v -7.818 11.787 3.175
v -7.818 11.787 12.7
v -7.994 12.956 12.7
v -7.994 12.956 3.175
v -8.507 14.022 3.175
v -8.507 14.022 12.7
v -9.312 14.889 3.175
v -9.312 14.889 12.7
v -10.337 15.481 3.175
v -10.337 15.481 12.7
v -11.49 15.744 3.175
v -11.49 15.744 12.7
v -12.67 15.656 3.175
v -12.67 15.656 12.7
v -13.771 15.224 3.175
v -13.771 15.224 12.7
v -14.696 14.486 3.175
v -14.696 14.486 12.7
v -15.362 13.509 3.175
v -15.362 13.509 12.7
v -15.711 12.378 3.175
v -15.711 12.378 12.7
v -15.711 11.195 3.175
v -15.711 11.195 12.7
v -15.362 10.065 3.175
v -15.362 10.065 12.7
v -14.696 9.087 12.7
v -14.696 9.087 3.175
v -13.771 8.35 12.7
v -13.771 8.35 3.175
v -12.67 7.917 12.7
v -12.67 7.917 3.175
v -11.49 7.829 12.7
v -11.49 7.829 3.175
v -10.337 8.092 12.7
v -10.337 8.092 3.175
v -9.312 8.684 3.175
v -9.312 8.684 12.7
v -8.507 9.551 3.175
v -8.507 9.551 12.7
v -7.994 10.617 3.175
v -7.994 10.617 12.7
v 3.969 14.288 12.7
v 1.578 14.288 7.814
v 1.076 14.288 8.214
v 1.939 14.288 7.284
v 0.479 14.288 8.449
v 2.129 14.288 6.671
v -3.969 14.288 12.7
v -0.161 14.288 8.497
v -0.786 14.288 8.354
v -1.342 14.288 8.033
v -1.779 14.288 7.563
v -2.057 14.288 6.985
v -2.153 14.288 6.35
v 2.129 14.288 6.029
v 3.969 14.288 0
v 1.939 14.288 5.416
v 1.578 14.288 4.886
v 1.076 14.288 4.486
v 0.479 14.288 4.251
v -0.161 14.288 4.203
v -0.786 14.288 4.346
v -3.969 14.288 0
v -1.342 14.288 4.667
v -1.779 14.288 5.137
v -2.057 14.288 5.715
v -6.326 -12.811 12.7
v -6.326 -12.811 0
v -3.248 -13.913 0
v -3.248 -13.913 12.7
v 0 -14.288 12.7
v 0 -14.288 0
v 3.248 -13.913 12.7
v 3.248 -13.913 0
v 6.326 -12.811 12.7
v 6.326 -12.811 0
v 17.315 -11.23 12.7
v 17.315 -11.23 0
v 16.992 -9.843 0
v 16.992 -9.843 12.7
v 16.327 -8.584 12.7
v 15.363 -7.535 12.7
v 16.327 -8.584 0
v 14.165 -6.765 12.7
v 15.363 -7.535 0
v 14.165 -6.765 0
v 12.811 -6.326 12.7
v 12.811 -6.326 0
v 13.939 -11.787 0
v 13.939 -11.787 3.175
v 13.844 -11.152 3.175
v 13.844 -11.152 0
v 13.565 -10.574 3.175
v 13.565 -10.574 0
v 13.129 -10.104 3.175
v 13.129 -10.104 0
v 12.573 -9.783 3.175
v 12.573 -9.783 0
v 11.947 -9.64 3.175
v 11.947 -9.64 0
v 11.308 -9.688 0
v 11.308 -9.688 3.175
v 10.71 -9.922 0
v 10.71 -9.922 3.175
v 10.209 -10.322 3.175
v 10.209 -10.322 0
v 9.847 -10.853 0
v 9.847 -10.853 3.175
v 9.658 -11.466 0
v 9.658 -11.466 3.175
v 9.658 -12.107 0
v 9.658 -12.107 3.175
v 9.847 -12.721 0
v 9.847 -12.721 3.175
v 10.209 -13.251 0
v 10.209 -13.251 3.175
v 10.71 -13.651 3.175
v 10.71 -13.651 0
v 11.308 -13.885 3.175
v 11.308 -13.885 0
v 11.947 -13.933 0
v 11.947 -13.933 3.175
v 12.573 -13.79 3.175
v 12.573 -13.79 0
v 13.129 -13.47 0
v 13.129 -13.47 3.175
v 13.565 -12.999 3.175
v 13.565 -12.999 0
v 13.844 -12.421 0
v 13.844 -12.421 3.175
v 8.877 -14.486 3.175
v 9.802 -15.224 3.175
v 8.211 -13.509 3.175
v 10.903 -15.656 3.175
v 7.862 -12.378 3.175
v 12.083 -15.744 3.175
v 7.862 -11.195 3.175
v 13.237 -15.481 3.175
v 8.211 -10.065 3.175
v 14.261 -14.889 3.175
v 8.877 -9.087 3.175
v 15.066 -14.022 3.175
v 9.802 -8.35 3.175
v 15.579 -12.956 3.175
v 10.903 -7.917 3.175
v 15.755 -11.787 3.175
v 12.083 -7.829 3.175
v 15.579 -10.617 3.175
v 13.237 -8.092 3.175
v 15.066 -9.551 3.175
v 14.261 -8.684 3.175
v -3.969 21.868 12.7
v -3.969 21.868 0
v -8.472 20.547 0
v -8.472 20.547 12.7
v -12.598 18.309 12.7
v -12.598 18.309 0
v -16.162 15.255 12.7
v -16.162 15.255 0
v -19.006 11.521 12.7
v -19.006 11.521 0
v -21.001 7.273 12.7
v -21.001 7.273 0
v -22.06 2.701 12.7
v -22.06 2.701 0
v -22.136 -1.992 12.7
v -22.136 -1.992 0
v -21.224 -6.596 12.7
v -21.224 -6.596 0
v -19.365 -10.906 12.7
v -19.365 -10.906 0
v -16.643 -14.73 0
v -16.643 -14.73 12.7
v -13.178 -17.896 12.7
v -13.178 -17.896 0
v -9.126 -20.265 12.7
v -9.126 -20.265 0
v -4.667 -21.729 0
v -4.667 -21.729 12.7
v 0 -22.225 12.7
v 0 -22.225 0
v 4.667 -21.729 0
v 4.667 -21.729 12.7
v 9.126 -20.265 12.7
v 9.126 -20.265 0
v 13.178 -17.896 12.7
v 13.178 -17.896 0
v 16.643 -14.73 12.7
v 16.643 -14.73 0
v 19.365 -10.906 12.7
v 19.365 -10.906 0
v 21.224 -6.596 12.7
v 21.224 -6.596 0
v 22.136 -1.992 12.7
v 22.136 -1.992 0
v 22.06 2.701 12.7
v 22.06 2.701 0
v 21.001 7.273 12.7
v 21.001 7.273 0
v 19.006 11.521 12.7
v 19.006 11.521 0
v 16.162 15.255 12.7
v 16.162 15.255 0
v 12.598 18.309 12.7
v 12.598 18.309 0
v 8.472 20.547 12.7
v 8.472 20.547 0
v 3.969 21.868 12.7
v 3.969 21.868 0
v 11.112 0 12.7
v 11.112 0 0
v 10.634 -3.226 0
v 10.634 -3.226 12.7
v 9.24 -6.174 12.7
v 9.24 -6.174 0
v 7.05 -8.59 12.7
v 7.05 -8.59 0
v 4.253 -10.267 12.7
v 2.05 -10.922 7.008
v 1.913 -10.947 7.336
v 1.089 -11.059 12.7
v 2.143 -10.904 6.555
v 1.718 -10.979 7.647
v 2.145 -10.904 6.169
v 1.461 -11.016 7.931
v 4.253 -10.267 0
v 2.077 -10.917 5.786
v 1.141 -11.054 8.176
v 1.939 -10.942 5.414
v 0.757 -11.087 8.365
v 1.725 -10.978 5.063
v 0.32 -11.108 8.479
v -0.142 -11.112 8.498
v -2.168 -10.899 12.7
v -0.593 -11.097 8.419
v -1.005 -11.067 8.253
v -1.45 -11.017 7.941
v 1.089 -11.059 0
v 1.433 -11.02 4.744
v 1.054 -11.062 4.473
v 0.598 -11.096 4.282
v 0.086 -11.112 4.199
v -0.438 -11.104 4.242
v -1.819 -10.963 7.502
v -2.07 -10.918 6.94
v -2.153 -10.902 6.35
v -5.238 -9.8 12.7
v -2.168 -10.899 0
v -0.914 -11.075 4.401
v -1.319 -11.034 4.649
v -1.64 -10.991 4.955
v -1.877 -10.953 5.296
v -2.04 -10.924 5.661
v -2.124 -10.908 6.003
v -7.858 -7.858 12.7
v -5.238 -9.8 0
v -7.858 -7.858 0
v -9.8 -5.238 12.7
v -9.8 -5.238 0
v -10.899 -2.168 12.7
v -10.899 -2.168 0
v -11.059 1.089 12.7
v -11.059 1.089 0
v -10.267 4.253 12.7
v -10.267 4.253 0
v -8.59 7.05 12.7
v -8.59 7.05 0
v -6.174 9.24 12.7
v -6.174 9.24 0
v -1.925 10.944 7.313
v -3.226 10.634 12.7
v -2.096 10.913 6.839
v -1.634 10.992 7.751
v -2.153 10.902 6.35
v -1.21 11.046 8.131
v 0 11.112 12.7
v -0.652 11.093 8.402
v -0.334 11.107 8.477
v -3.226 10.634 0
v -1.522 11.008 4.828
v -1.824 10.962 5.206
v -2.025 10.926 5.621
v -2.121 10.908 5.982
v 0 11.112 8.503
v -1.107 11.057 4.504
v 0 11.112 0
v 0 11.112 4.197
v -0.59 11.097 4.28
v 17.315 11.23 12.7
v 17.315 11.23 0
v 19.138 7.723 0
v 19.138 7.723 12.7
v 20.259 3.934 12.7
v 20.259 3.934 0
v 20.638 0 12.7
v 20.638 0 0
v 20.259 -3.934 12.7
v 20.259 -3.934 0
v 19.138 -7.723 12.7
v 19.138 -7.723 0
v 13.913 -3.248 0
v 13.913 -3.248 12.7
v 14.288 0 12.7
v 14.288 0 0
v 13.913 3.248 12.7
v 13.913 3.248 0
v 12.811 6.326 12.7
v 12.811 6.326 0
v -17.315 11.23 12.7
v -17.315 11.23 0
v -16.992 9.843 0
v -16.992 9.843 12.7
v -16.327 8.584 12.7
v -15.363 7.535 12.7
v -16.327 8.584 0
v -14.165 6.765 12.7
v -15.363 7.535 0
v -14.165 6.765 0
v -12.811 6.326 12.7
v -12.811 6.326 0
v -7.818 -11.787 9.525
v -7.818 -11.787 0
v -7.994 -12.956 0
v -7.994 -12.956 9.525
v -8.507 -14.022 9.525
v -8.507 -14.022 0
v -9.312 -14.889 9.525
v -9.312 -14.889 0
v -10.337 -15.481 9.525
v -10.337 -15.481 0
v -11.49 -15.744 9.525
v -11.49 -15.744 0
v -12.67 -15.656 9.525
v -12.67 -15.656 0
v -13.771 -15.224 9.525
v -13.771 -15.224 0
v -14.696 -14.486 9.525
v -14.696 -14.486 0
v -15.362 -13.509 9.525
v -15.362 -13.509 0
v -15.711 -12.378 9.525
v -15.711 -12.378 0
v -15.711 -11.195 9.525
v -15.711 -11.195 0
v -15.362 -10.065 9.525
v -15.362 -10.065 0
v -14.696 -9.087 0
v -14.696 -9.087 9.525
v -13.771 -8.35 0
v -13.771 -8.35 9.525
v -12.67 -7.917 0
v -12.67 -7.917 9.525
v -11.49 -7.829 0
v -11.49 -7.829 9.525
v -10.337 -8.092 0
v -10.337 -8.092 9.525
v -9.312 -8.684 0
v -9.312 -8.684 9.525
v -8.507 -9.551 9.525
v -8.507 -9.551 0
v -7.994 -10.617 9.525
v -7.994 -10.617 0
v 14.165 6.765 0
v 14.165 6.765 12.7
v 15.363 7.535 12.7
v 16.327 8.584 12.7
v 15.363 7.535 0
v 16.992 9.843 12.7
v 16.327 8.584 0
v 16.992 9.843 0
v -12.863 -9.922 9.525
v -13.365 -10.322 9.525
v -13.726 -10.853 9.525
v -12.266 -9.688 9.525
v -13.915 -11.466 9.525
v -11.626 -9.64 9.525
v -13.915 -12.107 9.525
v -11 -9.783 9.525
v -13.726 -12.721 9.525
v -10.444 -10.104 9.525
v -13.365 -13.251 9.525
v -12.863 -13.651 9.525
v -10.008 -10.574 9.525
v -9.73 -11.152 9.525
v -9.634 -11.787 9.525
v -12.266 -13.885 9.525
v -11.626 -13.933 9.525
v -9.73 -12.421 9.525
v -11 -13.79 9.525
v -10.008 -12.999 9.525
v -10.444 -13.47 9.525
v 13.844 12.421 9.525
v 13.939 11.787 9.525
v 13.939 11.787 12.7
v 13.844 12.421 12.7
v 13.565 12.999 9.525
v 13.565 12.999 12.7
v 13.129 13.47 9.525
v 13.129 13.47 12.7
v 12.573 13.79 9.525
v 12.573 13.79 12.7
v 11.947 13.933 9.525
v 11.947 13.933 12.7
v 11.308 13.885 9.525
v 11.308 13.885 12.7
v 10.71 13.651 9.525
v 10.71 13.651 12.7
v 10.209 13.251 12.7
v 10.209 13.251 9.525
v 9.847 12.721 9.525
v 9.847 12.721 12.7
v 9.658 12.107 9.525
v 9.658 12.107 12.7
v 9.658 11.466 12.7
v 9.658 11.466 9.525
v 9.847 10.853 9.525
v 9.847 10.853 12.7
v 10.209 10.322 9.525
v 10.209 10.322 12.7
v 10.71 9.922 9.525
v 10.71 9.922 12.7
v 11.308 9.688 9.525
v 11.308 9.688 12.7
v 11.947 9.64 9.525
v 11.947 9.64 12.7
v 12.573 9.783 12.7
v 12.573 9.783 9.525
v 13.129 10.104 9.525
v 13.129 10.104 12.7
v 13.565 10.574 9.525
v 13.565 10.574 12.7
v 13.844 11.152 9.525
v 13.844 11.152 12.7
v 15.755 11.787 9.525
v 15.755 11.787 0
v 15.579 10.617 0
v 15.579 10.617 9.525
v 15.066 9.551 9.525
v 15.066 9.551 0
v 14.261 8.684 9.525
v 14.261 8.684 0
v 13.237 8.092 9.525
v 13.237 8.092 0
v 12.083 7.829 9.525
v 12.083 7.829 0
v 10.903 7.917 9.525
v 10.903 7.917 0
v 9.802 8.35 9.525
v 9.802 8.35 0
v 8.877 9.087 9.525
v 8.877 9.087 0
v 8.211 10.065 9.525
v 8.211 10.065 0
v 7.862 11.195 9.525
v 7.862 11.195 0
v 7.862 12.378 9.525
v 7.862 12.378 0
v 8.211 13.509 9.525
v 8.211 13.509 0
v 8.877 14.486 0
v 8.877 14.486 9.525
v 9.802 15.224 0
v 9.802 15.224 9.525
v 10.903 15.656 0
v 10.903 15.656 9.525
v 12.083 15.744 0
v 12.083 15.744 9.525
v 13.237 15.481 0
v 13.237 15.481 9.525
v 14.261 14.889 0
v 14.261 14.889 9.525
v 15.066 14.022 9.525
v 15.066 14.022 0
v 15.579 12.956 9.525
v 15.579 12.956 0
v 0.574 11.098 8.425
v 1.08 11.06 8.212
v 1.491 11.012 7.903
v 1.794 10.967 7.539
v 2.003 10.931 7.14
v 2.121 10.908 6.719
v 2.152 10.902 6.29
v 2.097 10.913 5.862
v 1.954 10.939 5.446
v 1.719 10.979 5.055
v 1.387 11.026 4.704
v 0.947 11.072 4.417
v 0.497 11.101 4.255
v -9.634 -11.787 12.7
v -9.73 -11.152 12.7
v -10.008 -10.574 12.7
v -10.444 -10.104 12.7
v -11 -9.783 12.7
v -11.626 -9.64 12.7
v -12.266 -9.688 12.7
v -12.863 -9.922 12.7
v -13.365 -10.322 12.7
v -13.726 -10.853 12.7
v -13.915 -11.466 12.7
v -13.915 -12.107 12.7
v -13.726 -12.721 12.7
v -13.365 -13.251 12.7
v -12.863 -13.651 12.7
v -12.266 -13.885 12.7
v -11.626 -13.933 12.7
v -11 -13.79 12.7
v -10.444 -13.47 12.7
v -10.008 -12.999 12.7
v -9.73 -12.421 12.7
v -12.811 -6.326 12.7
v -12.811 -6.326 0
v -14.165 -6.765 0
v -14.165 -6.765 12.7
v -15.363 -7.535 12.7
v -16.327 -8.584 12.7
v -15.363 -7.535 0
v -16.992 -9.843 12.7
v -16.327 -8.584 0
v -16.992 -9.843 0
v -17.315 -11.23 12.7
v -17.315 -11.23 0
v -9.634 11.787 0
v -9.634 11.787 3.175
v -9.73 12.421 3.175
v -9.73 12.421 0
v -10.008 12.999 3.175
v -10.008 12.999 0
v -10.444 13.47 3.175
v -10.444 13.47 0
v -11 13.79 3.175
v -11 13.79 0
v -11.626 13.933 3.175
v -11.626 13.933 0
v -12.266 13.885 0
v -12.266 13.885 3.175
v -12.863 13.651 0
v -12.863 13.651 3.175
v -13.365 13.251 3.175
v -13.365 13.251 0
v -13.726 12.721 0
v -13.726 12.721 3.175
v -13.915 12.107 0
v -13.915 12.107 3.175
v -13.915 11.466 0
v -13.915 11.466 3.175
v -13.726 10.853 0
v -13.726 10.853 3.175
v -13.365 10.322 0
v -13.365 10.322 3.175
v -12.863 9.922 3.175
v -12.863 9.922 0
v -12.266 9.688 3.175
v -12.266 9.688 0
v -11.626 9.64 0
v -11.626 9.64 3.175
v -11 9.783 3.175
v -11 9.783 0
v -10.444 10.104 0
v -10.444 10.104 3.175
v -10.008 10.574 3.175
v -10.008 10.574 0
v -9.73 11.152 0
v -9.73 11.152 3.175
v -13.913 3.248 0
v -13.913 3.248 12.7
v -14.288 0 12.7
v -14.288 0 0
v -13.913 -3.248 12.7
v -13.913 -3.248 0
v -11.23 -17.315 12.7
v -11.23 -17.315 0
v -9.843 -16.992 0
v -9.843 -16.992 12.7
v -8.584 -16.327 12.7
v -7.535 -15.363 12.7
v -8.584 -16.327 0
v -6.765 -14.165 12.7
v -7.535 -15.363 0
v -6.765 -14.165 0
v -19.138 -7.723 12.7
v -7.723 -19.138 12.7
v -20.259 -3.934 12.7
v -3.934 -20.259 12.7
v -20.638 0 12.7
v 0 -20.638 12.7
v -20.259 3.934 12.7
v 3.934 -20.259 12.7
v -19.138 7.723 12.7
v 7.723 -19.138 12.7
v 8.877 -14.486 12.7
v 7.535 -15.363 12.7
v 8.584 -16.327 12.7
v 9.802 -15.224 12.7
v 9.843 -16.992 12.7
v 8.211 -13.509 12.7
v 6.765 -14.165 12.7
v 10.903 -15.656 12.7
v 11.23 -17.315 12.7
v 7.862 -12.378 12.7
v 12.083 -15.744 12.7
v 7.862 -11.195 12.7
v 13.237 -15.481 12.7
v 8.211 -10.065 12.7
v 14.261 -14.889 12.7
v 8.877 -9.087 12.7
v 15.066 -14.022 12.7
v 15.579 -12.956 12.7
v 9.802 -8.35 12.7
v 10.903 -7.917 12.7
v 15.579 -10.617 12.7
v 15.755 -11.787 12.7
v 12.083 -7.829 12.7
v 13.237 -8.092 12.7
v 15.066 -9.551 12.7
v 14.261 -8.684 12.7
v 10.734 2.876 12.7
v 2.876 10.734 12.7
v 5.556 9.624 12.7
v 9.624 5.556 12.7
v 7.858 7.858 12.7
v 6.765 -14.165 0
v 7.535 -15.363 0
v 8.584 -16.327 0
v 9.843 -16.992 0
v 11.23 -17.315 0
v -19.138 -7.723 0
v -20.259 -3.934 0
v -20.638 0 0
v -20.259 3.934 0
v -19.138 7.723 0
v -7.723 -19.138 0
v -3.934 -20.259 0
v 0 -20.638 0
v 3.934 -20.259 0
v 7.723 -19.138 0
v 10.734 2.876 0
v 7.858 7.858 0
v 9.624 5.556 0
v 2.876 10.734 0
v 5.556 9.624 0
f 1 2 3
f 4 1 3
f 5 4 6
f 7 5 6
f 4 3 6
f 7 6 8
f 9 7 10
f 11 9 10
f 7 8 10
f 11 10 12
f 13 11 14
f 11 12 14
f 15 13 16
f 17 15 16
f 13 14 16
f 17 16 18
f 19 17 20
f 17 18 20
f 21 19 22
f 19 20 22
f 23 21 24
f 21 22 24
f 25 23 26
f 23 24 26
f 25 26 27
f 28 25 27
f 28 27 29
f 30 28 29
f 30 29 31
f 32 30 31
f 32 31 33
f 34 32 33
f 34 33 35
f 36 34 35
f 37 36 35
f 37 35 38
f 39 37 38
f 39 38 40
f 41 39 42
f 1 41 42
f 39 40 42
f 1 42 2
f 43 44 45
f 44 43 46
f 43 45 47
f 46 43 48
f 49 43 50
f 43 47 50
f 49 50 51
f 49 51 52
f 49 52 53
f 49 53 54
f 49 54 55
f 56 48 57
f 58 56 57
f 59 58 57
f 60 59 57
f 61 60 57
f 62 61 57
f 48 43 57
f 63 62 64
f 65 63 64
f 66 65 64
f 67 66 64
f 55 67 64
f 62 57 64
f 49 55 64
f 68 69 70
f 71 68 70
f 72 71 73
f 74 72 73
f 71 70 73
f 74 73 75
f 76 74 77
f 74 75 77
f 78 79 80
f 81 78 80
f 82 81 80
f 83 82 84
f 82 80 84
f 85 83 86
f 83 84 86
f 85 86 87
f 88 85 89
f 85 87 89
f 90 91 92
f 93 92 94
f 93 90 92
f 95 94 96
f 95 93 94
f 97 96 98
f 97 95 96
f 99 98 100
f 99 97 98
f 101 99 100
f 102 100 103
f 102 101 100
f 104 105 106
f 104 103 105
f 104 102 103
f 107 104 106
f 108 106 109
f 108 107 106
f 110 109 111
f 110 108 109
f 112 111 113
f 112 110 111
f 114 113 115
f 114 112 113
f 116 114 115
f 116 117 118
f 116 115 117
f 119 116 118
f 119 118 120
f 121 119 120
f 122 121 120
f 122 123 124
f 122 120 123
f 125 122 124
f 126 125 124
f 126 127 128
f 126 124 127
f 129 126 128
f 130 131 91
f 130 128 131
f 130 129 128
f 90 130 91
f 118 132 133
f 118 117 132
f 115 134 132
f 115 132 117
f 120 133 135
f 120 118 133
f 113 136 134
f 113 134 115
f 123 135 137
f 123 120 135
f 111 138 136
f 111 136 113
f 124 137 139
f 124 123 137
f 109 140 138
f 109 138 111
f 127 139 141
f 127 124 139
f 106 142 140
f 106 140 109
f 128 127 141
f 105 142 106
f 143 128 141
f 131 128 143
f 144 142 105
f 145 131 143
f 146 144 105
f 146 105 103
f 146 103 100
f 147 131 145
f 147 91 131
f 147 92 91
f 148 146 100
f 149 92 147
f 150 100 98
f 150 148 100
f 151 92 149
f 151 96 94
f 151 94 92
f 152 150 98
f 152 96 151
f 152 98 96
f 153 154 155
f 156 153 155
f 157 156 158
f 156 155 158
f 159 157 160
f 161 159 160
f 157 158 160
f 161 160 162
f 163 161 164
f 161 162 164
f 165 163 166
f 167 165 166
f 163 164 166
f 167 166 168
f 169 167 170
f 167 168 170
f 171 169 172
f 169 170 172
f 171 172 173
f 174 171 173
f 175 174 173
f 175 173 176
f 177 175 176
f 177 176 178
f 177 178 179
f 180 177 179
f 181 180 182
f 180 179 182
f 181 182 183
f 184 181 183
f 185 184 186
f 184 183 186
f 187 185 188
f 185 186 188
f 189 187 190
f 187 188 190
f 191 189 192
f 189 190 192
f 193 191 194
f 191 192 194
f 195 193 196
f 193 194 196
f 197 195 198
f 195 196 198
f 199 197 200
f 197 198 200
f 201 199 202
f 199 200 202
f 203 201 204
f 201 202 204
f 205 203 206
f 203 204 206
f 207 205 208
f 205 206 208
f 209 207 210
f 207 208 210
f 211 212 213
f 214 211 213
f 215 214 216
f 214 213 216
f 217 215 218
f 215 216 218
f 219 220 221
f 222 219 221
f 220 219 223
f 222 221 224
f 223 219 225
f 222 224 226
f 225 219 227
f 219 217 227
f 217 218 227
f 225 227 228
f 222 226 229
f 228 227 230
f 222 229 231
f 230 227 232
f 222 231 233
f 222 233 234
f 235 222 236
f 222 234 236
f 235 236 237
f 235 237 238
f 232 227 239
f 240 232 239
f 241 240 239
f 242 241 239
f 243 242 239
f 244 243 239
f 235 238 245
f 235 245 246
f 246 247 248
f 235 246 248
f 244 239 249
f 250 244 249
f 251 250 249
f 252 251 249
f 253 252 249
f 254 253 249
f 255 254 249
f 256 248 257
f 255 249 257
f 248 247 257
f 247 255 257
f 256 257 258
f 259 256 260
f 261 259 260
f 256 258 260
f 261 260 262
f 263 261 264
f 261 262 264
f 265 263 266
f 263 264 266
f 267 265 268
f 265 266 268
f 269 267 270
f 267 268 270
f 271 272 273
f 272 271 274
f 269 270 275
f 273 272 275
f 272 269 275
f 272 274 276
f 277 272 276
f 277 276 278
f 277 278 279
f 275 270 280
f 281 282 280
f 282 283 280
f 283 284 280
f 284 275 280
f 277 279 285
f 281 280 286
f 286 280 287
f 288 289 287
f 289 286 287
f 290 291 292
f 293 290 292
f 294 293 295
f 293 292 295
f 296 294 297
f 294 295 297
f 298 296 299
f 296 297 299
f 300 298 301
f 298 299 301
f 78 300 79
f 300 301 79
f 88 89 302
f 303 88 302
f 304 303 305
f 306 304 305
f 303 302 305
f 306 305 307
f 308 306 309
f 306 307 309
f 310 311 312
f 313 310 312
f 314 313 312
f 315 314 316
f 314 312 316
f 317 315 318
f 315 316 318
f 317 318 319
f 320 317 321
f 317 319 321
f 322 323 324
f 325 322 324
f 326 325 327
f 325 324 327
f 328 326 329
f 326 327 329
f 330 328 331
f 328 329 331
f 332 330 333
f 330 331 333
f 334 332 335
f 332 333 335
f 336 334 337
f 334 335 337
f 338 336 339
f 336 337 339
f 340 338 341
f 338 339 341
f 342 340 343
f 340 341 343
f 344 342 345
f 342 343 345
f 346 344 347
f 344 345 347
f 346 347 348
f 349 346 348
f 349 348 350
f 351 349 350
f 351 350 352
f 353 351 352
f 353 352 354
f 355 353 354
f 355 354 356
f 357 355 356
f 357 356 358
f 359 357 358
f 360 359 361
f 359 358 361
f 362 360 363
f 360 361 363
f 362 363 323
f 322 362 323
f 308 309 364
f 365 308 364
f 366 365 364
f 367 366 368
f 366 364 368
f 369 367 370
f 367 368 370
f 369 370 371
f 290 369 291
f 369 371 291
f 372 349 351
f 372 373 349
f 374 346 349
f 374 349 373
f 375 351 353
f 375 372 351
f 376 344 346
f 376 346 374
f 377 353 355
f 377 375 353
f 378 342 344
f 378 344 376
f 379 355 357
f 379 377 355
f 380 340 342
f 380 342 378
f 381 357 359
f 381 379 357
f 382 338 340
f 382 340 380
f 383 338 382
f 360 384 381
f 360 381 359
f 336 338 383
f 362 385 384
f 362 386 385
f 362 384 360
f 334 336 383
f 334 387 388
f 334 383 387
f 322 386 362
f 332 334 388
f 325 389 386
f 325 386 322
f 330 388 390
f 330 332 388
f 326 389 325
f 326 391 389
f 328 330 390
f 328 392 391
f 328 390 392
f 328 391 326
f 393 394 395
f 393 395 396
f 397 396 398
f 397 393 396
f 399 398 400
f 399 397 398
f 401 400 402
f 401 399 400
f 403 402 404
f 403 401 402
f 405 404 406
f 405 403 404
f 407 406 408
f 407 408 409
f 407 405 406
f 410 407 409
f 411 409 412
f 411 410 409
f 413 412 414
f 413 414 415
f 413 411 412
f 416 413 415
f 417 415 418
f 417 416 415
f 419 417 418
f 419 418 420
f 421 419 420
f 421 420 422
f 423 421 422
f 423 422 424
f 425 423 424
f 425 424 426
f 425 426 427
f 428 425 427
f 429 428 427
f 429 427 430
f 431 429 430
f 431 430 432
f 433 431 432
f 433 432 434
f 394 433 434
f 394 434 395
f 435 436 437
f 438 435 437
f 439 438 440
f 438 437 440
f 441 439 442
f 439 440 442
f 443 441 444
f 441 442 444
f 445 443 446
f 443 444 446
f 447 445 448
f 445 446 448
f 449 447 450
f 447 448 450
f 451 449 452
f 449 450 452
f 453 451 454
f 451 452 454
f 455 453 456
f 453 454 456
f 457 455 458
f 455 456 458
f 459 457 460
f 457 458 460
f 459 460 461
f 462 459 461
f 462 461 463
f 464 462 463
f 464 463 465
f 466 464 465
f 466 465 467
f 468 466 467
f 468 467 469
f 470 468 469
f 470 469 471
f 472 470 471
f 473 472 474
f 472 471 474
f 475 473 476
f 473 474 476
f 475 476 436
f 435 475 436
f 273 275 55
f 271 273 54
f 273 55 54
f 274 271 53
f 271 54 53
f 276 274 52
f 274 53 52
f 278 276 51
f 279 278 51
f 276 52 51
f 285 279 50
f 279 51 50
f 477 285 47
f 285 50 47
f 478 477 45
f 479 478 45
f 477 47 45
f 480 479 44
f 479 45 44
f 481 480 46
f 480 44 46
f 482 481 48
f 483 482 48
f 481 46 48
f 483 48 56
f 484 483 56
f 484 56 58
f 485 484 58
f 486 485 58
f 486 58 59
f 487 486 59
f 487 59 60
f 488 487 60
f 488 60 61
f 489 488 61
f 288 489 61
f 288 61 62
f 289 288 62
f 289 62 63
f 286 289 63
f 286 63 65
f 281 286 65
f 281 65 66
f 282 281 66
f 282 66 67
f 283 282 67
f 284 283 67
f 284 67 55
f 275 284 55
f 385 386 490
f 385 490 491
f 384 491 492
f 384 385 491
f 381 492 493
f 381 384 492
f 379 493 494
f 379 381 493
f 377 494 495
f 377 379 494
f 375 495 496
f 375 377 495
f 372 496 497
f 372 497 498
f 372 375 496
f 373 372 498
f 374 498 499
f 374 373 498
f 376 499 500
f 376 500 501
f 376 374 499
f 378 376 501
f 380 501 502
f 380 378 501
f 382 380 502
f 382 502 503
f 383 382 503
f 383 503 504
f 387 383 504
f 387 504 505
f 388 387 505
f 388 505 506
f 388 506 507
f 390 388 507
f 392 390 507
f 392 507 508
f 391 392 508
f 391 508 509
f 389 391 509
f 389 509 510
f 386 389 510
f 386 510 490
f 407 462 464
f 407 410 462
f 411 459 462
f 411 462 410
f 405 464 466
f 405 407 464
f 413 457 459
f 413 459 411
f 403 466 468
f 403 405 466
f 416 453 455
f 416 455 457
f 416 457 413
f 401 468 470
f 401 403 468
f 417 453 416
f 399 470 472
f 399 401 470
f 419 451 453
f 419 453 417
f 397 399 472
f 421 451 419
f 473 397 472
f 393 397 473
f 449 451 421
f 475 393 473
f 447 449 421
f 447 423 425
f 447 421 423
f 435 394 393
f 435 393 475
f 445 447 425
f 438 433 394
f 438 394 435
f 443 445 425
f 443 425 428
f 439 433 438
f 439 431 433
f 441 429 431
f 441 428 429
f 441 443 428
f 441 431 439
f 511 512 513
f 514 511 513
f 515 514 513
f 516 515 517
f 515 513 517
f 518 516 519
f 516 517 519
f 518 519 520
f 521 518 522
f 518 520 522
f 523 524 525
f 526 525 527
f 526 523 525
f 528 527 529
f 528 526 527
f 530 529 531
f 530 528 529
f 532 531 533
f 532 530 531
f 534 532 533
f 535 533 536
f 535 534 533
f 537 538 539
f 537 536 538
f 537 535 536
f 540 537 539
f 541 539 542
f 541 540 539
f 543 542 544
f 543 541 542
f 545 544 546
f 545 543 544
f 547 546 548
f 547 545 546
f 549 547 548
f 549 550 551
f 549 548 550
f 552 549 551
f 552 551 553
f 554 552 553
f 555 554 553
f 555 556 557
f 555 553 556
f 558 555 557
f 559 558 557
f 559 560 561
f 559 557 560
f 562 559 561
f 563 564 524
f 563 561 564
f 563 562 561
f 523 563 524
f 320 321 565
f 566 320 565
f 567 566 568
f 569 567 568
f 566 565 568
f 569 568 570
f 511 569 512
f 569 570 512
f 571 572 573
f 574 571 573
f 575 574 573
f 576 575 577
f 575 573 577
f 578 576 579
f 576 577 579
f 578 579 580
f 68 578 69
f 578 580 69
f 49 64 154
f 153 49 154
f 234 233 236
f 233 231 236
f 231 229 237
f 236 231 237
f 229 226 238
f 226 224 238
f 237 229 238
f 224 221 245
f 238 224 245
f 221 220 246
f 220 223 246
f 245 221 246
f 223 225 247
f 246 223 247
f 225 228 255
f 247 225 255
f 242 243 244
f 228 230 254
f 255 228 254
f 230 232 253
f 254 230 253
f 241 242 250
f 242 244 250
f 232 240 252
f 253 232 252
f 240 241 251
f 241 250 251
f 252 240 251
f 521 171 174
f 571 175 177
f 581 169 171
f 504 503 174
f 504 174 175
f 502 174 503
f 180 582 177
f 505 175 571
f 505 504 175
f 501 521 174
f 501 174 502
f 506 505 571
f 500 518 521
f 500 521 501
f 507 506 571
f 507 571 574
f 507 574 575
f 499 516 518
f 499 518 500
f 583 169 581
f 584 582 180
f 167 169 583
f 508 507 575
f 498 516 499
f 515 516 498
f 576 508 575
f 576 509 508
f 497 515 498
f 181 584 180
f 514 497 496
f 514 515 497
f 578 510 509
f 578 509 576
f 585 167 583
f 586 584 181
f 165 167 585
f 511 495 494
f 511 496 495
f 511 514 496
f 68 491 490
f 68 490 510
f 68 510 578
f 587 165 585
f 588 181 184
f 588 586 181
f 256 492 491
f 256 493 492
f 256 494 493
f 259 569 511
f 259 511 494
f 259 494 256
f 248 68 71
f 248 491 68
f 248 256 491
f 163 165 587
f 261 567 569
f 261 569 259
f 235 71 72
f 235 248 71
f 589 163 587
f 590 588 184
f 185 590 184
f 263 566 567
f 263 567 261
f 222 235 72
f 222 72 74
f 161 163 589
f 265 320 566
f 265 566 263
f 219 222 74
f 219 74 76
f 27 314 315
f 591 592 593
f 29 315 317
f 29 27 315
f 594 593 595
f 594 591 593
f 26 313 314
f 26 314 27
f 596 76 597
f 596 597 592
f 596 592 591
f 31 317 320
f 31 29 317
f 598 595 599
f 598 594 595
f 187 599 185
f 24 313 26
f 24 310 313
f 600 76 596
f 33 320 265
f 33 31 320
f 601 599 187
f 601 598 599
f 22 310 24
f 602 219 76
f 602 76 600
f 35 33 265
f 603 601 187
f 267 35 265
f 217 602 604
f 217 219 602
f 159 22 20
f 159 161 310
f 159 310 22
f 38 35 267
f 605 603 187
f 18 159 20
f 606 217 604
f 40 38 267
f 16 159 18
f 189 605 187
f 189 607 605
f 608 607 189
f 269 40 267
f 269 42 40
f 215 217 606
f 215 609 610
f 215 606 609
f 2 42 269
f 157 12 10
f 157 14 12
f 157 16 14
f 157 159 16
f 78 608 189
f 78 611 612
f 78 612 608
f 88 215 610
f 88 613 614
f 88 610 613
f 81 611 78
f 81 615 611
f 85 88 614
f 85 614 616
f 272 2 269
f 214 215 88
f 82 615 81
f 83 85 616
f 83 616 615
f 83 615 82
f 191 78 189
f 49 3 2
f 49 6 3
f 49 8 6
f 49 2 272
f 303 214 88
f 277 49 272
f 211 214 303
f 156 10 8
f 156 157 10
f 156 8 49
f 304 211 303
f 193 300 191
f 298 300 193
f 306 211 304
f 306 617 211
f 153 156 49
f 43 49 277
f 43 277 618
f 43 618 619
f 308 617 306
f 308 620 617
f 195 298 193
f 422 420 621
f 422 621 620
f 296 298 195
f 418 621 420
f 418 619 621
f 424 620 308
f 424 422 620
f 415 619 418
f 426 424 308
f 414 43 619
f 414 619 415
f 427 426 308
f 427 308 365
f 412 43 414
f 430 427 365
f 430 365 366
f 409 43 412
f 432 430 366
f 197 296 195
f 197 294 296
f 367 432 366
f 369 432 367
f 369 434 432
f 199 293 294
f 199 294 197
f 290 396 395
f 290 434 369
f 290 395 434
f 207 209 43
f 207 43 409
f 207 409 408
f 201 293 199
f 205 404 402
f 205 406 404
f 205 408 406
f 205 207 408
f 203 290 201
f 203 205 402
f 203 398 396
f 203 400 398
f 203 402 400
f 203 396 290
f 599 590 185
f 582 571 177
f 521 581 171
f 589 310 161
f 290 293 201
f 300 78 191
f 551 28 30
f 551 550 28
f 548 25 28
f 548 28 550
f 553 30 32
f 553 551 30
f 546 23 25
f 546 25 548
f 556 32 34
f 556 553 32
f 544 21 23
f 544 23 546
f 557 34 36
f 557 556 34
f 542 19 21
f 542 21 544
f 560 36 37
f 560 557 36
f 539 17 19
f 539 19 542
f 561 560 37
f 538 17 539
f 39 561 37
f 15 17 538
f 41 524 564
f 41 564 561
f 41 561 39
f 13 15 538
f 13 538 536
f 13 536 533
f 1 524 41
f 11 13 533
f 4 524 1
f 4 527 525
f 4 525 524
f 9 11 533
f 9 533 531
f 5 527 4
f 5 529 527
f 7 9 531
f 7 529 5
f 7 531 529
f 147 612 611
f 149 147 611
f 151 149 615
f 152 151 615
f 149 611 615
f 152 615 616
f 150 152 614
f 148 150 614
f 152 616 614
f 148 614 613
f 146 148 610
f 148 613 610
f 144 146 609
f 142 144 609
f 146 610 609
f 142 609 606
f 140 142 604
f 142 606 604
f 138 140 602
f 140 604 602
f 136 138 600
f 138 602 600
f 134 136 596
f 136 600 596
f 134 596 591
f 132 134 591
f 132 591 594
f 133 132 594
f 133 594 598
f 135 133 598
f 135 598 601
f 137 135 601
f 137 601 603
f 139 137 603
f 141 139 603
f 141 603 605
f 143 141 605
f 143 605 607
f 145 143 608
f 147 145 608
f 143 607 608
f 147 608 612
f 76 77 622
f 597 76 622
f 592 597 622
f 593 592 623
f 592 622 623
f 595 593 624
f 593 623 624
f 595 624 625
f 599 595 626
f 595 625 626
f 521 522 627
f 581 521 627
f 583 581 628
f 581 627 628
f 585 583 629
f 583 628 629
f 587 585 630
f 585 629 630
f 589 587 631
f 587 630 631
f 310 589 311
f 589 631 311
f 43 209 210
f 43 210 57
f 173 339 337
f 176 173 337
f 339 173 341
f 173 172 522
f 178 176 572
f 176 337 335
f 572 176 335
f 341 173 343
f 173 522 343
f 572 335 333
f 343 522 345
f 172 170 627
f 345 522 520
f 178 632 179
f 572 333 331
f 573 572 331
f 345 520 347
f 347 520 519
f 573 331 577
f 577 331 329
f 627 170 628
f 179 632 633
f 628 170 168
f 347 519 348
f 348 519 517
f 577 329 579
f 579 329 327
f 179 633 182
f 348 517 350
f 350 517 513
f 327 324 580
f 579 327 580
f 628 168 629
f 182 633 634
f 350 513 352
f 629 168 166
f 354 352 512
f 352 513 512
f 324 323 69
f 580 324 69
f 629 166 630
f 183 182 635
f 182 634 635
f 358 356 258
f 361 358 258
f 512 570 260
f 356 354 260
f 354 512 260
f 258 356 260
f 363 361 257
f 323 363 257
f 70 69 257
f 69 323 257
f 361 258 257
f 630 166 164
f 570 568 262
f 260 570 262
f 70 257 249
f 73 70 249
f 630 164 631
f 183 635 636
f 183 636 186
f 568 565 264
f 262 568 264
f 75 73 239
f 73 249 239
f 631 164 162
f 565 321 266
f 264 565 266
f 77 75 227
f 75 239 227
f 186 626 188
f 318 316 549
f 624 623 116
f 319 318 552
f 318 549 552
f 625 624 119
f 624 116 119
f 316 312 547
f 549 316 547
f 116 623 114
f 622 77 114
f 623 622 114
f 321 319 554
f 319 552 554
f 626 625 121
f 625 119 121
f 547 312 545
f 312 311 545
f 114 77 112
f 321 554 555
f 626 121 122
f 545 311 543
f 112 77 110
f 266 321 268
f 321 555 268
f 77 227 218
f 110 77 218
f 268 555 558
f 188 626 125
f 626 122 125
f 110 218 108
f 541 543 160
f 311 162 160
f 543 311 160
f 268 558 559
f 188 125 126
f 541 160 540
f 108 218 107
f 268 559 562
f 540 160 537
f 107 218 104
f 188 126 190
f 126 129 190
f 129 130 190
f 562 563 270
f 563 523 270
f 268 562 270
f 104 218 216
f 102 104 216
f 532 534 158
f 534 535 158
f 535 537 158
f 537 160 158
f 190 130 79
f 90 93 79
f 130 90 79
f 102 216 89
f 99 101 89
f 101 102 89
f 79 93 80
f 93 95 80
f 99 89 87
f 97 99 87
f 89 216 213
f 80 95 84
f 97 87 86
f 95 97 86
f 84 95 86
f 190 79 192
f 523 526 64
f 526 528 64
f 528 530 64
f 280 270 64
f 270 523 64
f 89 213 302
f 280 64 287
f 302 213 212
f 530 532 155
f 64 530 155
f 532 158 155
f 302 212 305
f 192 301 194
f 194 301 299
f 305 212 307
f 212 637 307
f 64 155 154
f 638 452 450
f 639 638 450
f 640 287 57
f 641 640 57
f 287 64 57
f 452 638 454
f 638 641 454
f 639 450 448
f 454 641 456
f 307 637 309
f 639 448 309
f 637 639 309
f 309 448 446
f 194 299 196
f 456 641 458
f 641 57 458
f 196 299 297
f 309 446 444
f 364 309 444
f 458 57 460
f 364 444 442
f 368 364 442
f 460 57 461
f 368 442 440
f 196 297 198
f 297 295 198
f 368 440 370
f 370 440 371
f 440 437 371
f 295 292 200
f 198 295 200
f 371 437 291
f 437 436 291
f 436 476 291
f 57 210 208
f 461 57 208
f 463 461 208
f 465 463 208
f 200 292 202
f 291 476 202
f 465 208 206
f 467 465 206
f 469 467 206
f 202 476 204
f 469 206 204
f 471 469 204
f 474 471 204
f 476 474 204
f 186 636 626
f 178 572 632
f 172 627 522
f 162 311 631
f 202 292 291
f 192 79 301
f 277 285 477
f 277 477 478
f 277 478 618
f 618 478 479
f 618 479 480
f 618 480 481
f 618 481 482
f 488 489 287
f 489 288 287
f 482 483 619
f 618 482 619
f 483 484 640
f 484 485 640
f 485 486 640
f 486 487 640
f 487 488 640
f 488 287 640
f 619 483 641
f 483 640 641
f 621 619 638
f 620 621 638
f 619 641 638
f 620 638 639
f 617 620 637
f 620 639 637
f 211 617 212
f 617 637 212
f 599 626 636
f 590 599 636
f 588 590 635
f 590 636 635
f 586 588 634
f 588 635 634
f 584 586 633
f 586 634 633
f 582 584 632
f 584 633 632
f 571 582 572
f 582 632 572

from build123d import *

# Parameters (mm, degrees)
F0_R            = 2.15265
F1_DEPTH        = 12.7
F2_R            = 2.15265
F3_REACH        = 42.6021136501
F6_R            = 3.96875
F7_DEPTH        = 9.525
F9_DEPTH        = 12.7
F9_COPIES_COUNT = 3
F9_COPIES_ANGLE = 180
F10_R           = 3.96875
F11_DEPTH       = 9.525


# Not quite as in the source:
# - a pattern or mirror of a feature is missing from the dataset's text; its kind, count and spacing are read off the source's solid


with BuildPart() as f1:
    # F0 (on Top) → F1 (new body)
    with BuildSketch(Plane.XY):
        with BuildLine():
            Line((3.96875, 14.2875), (0, 14.2875))
            Line((0, 14.2875), (-3.96875, 14.2875))
            Line((-3.96875, 14.2875), (-3.96875, 21.8677764859))
            ThreePointArc((-3.96875, 21.8677764859), (0, -22.225), (3.96875, 21.8677764859))
            Line((3.96875, 21.8677764859), (3.96875, 14.2875))
        make_face()
        with Locations((-11.7865861589, -11.7865861589)):
            Circle(F0_R, mode=Mode.SUBTRACT)
        with Locations((11.7865861589, -11.7865861589)):
            Circle(F0_R, mode=Mode.SUBTRACT)
        with Locations((-11.7865861589, 11.7865861589)):
            Circle(F0_R, mode=Mode.SUBTRACT)
        with BuildLine():
            ThreePointArc((0, 11.1125), (7.8577241059, 7.8577241059), (11.1125, 0))
            ThreePointArc((11.1125, 0), (-7.8577241059, -7.8577241059), (0, 11.1125))
        make_face(mode=Mode.SUBTRACT)
        with Locations((11.7865861589, 11.7865861589)):
            Circle(F0_R, mode=Mode.SUBTRACT)
    extrude(amount=F1_DEPTH)

    f3_end = f1.faces().sort_by_distance((0, -11.1125, 6.35))[0]
    # F2 (on face) → F3 (cut, up to a face of the model that its end follows)
    with BuildSketch(Plane(origin=(0, 14.2875, 0), x_dir=(-1, 0, 0), z_dir=(0, 1, 0))):
        with Locations((0, 6.35)):
            Circle(F2_R)
    f3_long = extrude(amount=-F3_REACH, mode=Mode.PRIVATE)
    add(split(f3_long, bisect_by=f3_end, keep=Keep.ALL, mode=Mode.PRIVATE).solids().sort_by_distance((0, 14.2875, 6.35))[0], mode=Mode.SUBTRACT)

    # F6 (on face) → F7 (cut, through all)
    with BuildSketch(Plane(origin=(0, 0, 0), x_dir=(1, 0, 0), z_dir=(0, 0, -1))):
        with Locations((11.7865861589, -11.7865861589)):
            Circle(F6_R)
        with Locations((-11.7865861589, 11.7865861589)):
            Circle(F6_R)
    extrude(amount=-F7_DEPTH, mode=Mode.SUBTRACT)

    # F8 (on face) → F9 (cut, through all)
    with BuildSketch(Plane(origin=(0, 0, 0), x_dir=(1, 0, 0), z_dir=(0, 0, -1))):
        with BuildLine():
            ThreePointArc((-17.3148424047, -11.229543123), (-15.8788163052, -8.0281867), (-12.8109235396, -6.3255746232))
            ThreePointArc((-12.8109235396, -6.3255746232), (-14.2875, 0), (-12.8109235396, 6.3255746232))
            ThreePointArc((-12.8109235396, 6.3255746232), (-15.8788163052, 8.0281867), (-17.3148424047, 11.229543123))
            ThreePointArc((-17.3148424047, 11.229543123), (-20.6375, 0), (-17.3148424047, -11.229543123))
        make_face()
    f9 = extrude(amount=-F9_DEPTH, mode=Mode.SUBTRACT)

    # F9_copies: F9 ×3 about axis
    f9_copies_axis = Axis((0, 0, 0), (0, 0, 1))
    for i in range(1, F9_COPIES_COUNT):
        add(f9.rotate(f9_copies_axis, i * F9_COPIES_ANGLE / (F9_COPIES_COUNT - 1)), mode=Mode.SUBTRACT)

    # F10 (on face) → F11 (cut, through all)
    with BuildSketch(Plane.XY.offset(12.7)):
        with Locations((11.7865861589, -11.7865861589)):
            Circle(F10_R)
        with Locations((-11.7865861589, 11.7865861589)):
            Circle(F10_R)
    extrude(amount=-F11_DEPTH, mode=Mode.SUBTRACT)


solid = f1.part
